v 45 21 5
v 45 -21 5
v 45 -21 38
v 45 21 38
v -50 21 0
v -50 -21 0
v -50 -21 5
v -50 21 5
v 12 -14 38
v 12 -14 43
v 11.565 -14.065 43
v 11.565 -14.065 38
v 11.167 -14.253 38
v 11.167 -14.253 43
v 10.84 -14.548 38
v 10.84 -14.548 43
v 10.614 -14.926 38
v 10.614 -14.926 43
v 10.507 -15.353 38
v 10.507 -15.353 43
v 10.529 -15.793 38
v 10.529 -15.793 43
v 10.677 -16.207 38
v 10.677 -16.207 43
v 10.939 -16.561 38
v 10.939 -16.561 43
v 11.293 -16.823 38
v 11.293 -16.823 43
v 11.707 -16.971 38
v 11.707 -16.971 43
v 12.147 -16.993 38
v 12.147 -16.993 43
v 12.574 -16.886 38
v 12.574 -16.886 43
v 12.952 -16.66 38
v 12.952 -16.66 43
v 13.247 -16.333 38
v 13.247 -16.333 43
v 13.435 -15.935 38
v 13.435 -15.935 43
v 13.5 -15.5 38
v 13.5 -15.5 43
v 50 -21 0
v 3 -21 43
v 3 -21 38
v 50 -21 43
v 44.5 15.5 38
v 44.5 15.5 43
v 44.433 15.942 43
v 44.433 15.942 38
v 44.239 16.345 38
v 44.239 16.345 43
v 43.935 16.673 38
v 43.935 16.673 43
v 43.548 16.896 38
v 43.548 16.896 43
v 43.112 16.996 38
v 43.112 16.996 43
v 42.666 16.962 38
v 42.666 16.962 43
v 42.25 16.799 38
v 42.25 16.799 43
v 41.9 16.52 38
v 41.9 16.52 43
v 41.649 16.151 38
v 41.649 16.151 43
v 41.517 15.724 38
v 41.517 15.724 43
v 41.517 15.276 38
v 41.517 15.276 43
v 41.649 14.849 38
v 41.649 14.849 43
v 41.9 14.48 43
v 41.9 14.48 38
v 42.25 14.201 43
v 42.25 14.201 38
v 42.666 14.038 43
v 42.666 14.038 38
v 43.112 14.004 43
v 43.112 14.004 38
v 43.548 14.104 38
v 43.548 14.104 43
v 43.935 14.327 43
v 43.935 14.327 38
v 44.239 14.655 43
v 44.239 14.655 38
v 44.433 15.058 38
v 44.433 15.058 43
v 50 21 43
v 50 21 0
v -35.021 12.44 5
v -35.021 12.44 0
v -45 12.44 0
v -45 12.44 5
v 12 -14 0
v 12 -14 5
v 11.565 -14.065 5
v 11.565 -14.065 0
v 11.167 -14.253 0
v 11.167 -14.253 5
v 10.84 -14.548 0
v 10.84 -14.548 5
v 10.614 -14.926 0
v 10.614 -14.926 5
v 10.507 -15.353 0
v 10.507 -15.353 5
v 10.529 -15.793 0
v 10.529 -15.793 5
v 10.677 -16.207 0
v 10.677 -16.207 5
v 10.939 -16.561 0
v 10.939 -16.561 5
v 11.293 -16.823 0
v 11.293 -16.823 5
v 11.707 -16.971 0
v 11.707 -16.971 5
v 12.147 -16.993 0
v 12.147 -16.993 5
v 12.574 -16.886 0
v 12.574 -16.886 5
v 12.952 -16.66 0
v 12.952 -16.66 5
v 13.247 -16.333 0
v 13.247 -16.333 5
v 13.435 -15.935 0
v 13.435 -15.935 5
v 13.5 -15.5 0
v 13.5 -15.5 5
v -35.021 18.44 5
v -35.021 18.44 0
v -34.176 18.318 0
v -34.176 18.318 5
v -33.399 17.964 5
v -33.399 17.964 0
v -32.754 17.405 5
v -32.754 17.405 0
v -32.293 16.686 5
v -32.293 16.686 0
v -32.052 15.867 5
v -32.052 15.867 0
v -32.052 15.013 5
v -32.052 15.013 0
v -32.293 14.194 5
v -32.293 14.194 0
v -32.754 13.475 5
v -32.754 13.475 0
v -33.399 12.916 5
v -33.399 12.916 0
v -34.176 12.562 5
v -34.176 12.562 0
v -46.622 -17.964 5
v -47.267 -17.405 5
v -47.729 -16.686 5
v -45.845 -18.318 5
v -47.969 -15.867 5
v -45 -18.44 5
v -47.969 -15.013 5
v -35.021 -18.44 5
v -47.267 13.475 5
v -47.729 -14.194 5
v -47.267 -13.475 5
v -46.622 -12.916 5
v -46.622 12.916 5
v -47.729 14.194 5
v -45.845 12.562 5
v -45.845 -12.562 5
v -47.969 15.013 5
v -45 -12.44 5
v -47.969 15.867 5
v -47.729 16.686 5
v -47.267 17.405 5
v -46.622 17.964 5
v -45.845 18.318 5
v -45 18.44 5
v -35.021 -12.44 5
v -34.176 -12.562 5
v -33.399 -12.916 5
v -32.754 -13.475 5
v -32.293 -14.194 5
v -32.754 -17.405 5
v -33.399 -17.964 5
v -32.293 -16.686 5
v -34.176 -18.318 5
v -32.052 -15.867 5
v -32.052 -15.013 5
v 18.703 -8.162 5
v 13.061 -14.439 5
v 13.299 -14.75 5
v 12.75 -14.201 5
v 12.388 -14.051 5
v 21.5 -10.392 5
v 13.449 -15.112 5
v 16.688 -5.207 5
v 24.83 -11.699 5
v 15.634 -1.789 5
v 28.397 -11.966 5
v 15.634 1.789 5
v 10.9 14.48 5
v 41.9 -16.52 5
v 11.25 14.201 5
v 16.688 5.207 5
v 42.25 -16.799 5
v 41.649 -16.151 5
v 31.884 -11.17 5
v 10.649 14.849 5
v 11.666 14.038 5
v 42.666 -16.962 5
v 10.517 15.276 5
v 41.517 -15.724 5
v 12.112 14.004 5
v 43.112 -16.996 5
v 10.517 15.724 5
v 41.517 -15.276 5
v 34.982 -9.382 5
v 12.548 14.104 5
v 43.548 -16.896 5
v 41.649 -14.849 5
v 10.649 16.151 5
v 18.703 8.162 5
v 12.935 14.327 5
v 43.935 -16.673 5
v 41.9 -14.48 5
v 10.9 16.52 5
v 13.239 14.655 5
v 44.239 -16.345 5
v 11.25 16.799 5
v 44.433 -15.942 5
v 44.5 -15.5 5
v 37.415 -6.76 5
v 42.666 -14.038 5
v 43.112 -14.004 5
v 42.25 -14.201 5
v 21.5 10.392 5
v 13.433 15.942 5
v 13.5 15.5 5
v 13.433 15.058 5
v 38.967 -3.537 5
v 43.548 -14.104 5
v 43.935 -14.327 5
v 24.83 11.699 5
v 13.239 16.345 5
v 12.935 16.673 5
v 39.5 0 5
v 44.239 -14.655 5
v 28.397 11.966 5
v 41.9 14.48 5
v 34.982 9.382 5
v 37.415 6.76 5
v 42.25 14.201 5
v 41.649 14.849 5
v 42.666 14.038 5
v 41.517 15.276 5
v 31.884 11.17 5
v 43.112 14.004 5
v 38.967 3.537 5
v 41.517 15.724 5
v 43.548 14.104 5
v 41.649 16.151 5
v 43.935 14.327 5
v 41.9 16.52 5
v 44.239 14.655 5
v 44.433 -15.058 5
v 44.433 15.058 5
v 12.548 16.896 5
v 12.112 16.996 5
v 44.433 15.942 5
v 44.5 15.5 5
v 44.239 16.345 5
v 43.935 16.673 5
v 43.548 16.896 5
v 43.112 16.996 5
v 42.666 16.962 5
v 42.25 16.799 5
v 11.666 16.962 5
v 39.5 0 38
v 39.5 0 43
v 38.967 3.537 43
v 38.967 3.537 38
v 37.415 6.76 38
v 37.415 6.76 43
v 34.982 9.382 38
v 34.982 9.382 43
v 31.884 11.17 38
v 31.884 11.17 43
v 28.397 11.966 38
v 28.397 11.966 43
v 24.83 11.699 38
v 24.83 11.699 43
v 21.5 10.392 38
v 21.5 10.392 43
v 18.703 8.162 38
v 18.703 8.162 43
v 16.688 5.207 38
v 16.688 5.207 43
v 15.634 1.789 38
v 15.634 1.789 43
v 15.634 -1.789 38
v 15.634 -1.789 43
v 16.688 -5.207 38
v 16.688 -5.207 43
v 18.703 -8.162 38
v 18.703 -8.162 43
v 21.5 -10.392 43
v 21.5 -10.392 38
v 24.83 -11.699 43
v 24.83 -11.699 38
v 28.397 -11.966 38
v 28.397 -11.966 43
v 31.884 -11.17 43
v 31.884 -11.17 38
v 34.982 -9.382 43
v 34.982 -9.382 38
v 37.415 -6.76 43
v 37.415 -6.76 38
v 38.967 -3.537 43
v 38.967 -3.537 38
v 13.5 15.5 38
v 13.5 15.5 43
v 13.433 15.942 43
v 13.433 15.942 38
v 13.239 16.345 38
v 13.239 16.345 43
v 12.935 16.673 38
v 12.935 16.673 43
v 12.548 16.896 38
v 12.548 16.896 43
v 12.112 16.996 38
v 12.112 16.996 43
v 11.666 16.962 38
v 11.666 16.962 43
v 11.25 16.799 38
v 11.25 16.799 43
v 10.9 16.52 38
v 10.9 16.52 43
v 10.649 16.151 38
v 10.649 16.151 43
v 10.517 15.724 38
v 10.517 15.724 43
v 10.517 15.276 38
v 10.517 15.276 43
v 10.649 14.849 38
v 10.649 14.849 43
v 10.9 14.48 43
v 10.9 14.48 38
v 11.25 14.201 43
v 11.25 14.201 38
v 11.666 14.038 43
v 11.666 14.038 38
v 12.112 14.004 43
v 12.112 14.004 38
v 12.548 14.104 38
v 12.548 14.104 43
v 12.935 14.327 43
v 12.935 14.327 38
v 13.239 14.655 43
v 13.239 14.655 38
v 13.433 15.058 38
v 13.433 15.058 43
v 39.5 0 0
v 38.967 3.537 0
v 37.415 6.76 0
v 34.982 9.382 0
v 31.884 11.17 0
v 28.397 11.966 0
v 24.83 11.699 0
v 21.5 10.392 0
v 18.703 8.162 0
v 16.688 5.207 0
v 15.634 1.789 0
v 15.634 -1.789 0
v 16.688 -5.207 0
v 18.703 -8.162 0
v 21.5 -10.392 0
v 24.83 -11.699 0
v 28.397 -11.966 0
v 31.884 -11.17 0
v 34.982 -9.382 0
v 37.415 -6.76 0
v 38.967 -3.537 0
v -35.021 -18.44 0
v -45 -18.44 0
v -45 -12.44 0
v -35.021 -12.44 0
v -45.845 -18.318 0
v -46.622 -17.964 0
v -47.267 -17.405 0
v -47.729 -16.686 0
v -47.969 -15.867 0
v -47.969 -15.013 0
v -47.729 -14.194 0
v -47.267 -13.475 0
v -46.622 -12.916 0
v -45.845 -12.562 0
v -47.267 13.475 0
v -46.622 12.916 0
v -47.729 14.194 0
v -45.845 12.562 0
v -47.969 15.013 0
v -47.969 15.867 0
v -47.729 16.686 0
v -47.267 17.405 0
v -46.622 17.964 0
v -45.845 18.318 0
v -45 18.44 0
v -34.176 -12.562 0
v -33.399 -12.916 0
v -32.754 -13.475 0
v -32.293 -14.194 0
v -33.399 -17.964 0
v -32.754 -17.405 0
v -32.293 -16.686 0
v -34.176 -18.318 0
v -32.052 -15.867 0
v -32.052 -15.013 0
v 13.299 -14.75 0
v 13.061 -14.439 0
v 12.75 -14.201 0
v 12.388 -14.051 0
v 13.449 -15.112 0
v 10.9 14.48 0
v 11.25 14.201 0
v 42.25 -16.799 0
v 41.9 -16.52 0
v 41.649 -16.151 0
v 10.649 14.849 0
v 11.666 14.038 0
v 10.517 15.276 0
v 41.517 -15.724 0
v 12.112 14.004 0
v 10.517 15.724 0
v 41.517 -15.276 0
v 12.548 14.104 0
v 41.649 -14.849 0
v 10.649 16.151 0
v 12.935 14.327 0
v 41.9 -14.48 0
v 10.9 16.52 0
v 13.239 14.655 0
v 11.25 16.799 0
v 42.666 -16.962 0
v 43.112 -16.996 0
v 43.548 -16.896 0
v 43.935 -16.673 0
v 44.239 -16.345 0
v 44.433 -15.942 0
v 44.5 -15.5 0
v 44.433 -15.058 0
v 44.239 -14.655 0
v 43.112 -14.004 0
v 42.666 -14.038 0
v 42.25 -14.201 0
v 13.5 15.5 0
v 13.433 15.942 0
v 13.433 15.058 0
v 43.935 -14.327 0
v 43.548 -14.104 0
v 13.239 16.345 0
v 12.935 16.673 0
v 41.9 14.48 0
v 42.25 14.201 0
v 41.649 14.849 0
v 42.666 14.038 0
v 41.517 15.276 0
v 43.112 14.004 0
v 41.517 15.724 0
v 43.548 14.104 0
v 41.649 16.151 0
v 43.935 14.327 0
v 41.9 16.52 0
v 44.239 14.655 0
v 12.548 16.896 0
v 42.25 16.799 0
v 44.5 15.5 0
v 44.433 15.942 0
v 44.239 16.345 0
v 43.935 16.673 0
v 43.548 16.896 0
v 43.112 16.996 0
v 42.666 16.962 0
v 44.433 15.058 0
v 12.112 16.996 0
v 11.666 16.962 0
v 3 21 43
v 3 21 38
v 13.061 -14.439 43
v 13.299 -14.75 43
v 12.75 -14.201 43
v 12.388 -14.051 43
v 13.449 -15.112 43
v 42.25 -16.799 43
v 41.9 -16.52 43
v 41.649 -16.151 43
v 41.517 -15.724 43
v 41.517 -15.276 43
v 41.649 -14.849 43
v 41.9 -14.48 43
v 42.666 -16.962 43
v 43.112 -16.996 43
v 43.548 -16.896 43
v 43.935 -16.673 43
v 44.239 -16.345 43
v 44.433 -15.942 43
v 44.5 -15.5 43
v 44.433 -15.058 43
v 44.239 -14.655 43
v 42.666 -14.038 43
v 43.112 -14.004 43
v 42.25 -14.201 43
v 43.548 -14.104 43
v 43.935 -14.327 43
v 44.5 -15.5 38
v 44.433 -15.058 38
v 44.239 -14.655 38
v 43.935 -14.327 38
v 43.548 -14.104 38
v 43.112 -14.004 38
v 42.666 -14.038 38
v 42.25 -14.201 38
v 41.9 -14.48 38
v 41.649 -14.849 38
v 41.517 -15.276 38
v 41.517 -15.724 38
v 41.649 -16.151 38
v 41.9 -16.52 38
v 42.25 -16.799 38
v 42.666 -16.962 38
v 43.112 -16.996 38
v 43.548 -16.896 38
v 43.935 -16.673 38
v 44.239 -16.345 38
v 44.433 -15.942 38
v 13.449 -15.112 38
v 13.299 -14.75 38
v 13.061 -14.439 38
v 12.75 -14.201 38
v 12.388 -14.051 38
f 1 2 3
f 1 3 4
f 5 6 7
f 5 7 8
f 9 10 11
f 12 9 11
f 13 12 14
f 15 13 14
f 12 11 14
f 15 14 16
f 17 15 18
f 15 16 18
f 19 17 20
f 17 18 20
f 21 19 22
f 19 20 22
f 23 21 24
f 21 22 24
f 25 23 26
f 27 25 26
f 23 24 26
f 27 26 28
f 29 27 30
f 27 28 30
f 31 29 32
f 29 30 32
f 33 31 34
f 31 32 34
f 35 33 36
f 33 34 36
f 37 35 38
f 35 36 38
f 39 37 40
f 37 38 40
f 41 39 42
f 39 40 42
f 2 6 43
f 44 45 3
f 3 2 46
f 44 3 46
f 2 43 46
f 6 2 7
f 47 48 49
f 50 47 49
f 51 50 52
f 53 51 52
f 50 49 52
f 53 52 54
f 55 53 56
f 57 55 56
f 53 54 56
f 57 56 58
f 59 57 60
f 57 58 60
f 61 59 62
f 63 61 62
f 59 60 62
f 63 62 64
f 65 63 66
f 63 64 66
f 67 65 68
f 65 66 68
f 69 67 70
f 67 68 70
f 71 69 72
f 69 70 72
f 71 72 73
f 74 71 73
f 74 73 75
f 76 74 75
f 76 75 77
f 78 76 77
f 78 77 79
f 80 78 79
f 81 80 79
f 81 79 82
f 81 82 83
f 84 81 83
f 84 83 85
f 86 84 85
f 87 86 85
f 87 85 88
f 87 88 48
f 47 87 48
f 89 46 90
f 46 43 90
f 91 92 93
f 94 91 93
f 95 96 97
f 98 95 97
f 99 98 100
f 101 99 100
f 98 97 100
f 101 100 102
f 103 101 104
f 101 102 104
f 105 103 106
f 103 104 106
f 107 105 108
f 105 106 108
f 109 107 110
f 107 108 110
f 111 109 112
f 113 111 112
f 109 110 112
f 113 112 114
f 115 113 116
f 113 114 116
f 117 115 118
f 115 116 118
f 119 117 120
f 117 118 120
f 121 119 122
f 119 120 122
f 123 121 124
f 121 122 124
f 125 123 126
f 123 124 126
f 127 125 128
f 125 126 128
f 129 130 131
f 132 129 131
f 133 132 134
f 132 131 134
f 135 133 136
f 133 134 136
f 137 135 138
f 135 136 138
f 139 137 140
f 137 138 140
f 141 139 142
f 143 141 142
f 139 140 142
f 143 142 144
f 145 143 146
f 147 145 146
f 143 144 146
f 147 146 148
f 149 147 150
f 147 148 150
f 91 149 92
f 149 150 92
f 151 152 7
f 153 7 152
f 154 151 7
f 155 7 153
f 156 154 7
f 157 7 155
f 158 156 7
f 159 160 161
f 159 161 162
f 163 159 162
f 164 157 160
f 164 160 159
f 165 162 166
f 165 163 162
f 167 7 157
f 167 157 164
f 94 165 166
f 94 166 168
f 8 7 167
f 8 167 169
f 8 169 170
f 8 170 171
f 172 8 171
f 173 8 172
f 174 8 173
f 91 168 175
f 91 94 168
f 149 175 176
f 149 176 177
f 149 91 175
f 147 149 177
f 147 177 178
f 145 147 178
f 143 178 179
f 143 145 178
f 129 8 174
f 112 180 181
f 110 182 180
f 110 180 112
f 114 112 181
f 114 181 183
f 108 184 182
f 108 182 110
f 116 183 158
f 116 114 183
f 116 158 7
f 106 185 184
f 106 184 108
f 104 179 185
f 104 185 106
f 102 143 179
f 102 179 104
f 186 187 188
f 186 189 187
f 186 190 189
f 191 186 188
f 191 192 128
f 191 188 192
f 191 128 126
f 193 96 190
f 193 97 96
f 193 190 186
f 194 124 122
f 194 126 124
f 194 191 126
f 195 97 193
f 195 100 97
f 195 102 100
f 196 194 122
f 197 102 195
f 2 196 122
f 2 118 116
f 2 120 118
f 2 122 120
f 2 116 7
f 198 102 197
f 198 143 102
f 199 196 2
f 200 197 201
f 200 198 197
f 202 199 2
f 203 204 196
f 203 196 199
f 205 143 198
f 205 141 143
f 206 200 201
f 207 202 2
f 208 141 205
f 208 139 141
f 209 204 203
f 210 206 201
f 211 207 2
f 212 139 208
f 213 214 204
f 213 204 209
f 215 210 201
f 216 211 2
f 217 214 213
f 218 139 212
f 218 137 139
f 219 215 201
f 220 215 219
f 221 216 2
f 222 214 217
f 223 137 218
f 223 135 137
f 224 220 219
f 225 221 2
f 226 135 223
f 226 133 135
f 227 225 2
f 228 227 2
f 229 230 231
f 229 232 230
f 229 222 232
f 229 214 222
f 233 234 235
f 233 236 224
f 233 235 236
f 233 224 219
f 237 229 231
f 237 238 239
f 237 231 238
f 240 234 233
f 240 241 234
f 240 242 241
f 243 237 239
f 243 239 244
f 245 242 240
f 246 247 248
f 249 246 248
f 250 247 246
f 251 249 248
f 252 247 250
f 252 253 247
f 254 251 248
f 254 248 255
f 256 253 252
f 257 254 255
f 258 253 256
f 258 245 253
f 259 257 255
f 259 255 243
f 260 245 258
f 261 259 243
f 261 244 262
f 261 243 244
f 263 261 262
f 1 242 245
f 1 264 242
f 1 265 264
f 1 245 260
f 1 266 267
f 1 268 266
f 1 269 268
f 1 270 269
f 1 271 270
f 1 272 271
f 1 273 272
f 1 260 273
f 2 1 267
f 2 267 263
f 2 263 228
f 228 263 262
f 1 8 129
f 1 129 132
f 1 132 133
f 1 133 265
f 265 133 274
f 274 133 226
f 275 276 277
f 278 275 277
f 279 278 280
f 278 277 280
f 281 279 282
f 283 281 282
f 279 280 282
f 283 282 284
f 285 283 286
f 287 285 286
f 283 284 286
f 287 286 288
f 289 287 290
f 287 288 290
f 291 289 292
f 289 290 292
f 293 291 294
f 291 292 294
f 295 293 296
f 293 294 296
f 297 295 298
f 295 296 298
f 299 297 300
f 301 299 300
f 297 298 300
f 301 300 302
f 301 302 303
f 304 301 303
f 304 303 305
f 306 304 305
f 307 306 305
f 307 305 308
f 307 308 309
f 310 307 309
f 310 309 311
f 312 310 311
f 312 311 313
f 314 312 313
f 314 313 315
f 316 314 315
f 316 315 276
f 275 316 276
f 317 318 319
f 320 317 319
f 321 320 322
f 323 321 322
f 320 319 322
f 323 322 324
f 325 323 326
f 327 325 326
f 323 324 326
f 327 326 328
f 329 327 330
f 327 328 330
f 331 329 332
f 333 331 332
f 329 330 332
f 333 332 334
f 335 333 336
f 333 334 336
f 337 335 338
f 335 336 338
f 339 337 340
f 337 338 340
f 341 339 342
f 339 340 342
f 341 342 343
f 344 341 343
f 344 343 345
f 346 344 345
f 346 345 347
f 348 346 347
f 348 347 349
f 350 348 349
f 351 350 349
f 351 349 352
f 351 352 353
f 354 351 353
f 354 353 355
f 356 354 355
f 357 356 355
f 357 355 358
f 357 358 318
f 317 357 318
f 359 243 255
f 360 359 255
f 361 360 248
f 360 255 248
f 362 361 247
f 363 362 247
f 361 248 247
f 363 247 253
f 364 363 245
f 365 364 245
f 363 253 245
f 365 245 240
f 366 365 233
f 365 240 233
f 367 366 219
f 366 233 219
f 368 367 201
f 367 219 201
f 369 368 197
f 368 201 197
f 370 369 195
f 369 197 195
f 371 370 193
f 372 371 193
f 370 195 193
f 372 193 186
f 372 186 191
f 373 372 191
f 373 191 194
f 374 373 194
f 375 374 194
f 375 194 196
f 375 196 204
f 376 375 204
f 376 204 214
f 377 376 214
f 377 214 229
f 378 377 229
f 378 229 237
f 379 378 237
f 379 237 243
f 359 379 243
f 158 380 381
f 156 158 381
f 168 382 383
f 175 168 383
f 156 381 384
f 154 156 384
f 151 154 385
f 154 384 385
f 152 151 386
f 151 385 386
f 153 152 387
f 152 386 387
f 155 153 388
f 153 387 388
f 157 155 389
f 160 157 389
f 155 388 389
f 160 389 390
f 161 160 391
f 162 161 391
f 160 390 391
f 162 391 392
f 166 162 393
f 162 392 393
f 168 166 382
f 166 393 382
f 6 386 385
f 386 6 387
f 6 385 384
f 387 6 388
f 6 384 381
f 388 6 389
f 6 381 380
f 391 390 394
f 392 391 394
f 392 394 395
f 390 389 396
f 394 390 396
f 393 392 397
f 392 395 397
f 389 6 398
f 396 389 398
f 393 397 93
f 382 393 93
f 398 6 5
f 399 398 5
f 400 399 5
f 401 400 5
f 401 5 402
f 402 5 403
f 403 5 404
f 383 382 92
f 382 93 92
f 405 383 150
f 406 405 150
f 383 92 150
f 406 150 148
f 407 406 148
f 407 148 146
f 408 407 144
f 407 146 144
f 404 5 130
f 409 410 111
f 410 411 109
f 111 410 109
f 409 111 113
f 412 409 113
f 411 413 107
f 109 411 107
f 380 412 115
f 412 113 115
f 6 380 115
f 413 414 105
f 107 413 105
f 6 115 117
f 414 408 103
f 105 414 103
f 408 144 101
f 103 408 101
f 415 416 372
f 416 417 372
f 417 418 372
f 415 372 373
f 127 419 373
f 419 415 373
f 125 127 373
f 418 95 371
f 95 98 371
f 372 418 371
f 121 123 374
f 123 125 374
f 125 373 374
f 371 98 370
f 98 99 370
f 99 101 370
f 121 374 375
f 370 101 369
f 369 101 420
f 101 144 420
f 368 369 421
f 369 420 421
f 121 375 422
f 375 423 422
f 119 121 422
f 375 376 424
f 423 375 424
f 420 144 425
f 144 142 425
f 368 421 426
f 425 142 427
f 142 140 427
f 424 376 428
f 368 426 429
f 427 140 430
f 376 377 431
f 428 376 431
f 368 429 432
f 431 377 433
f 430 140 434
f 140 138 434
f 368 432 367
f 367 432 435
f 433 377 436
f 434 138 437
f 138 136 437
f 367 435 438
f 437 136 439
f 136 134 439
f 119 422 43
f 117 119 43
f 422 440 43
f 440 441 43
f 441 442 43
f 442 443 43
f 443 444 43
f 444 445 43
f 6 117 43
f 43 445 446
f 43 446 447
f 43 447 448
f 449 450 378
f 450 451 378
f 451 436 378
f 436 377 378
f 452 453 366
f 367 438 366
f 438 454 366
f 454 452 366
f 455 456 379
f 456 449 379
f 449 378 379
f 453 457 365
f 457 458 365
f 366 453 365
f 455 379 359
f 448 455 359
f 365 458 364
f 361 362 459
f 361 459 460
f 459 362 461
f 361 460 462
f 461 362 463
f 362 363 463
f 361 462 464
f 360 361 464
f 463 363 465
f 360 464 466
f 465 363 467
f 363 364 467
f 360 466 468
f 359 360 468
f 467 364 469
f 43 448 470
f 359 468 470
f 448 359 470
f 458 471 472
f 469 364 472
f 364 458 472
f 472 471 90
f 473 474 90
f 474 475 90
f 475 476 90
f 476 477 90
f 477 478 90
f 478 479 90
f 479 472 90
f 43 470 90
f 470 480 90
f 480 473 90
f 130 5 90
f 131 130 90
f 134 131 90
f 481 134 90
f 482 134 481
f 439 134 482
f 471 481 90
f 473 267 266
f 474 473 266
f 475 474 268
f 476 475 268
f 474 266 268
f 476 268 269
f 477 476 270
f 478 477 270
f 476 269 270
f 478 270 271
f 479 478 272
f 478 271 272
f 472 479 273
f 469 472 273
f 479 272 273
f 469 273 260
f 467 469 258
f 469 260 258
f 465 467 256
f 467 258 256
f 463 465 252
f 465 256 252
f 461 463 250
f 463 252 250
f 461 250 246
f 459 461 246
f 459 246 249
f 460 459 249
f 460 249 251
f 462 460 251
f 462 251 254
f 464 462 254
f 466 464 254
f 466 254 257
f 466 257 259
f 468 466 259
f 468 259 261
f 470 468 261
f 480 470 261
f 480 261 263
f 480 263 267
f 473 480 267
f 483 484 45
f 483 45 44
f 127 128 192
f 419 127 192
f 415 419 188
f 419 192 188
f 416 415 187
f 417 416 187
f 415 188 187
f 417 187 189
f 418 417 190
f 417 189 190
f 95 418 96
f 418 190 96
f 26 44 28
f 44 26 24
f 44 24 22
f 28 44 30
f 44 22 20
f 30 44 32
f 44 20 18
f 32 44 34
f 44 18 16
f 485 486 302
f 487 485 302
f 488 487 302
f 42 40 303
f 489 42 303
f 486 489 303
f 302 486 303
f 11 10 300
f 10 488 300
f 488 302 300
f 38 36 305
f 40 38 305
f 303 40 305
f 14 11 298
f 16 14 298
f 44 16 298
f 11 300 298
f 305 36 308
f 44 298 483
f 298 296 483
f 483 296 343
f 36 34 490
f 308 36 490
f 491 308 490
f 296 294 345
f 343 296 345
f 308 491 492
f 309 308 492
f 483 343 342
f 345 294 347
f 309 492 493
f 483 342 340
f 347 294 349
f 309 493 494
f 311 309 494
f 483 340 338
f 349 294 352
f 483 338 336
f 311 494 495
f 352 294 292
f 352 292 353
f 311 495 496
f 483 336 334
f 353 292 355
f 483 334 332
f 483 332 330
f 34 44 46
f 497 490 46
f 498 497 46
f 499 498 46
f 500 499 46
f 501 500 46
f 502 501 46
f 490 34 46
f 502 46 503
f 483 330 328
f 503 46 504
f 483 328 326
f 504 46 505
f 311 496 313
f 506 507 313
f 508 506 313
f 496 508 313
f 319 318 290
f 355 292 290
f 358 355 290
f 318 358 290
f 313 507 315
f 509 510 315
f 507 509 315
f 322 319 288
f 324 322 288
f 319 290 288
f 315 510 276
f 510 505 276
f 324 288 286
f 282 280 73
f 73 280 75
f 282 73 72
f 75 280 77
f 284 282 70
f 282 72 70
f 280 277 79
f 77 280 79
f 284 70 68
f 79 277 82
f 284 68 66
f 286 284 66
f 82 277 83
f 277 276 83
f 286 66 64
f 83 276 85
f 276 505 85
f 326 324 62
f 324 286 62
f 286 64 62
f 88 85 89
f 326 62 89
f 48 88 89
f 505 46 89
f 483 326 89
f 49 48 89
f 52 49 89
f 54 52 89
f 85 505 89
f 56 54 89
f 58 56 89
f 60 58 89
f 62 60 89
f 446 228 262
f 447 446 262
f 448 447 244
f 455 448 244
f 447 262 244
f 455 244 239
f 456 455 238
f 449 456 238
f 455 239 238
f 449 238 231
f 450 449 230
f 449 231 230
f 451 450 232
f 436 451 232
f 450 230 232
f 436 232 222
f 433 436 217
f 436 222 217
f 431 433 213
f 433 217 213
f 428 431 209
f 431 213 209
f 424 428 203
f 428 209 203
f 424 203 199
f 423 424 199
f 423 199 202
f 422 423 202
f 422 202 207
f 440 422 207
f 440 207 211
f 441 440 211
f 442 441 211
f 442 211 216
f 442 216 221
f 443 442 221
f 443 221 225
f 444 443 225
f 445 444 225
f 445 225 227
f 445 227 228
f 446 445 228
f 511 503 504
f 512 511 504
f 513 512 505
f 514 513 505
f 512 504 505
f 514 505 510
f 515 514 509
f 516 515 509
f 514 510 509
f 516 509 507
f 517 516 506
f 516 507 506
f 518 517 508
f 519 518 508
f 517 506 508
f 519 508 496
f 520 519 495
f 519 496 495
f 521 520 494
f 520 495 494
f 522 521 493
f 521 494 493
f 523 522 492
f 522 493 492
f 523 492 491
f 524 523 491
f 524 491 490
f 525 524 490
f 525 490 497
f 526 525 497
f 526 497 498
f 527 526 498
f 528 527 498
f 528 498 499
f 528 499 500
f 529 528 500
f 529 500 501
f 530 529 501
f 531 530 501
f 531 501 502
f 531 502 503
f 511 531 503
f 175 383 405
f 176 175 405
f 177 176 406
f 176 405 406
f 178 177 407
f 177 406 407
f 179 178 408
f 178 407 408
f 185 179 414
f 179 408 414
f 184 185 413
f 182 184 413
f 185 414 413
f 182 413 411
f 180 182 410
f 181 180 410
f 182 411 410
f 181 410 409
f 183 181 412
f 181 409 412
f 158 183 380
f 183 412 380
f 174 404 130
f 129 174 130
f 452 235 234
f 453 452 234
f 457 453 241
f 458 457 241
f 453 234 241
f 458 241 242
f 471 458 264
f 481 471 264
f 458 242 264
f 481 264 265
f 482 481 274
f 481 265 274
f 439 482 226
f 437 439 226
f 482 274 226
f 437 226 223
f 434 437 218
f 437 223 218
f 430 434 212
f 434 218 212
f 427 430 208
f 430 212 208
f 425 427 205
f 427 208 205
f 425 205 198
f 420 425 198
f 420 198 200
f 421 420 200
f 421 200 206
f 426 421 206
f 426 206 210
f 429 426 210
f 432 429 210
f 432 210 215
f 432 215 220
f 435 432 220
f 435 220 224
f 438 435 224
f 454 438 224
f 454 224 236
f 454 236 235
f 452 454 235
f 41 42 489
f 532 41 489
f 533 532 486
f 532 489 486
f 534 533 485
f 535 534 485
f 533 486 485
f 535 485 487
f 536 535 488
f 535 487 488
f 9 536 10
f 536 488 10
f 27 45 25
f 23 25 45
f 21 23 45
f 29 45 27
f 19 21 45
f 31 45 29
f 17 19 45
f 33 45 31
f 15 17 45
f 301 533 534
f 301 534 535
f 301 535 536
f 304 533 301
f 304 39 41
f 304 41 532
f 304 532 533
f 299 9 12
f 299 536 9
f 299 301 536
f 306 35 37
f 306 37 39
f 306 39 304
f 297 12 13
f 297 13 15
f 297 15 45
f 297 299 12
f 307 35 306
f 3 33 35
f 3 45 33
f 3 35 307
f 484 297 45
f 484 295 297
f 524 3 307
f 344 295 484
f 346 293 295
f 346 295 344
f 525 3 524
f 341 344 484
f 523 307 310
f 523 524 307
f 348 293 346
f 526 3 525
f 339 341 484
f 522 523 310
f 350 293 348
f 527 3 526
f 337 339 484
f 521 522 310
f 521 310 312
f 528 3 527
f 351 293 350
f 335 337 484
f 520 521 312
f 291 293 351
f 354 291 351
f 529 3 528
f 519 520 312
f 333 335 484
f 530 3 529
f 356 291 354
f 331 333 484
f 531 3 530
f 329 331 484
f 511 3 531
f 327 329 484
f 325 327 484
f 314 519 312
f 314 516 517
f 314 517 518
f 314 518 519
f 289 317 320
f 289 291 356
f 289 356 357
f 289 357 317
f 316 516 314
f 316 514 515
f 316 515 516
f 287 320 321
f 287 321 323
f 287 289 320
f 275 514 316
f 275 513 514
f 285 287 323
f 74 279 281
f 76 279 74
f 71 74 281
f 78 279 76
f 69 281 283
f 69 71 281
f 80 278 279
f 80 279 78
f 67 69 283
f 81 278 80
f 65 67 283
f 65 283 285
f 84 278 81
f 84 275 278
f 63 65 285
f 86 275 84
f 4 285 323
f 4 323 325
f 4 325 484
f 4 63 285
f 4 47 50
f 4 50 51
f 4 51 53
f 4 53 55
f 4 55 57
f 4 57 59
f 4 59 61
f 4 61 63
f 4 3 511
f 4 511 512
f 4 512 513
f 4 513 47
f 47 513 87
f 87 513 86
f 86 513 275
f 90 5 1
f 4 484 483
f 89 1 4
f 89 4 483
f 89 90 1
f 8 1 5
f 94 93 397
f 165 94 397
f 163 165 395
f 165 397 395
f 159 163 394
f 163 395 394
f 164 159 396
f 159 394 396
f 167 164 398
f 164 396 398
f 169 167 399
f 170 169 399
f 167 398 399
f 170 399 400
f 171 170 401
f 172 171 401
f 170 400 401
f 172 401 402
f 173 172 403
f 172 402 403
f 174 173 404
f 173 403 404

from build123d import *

# Parameters (mm, degrees)
CROQUIS1_W              = 100
CROQUIS1_H              = 42
SALIENTE_EXTRUIR1_DEPTH = 5
CROQUIS2_W              = 5
CROQUIS2_H              = 42
SALIENTE_EXTRUIR2_DEPTH = 38
CROQUIS3_W              = 5
CROQUIS3_H              = 42
SALIENTE_EXTRUIR3_DEPTH = 42
CROQUIS7_R              = 1.5
CORTAR_EXTRUIR1_DEPTH   = 43
CROQUIS8_R              = 12
CORTAR_EXTRUIR2_DEPTH   = 43


with BuildPart() as part:
    # Croquis1 → Saliente-Extruir1 (new body)
    with BuildSketch(Plane.XY):
        Rectangle(CROQUIS1_W, CROQUIS1_H)
        with BuildLine():
            Line((-45, 18.44), (-35.021412409, 18.44))
            ThreePointArc((-35.021412409, 18.44), (-32.021412409, 15.44), (-35.021412409, 12.44))
            Line((-35.021412409, 12.44), (-45, 12.44))
            ThreePointArc((-45, 12.44), (-48, 15.44), (-45, 18.44))
        make_face(mode=Mode.SUBTRACT)
        with BuildLine():
            Line((-45, -12.44), (-35.021412409, -12.44))
            ThreePointArc((-35.021412409, -12.44), (-32.021412409, -15.44), (-35.021412409, -18.44))
            Line((-35.021412409, -18.44), (-45, -18.44))
            ThreePointArc((-45, -18.44), (-48, -15.44), (-45, -12.44))
        make_face(mode=Mode.SUBTRACT)
    extrude(amount=SALIENTE_EXTRUIR1_DEPTH)

    # Croquis2 → Saliente-Extruir2 (add)
    with BuildSketch(Plane.XY.offset(5)):
        with Locations((47.5, 0)):
            Rectangle(CROQUIS2_W, CROQUIS2_H)
    extrude(amount=SALIENTE_EXTRUIR2_DEPTH)

    # Croquis3 → Saliente-Extruir3 (add)
    with BuildSketch(Plane.ZY.offset(-45)):
        with Locations((40.5, 0)):
            Rectangle(CROQUIS3_W, CROQUIS3_H)
    extrude(amount=SALIENTE_EXTRUIR3_DEPTH)

    # Croquis7 → Cortar-Extruir1 (cut)
    with BuildSketch(Plane.XY.offset(43)):
        with BuildLine():
            ThreePointArc((13.5, -15.5), (13.060660172, -14.439339828), (12, -14))
            Line((12, -14), (12, -15.5))
            Line((12, -15.5), (13.5, -15.5))
        make_face()
        with BuildLine():
            Line((12, -15.5), (12, -14))
            ThreePointArc((12, -14), (10.939339828, -16.560660172), (13.5, -15.5))
            Line((13.5, -15.5), (12, -15.5))
        make_face()
        with Locations((12, 15.5)):
            Circle(CROQUIS7_R)
        with Locations((43, 15.5)):
            Circle(CROQUIS7_R)
        with Locations((43, -15.5)):
            Circle(CROQUIS7_R)
    extrude(amount=-CORTAR_EXTRUIR1_DEPTH, mode=Mode.SUBTRACT)

    # Croquis8 → Cortar-Extruir2 (cut)
    with BuildSketch(Plane.XY.offset(43)):
        with Locations((27.5, 0)):
            Circle(CROQUIS8_R)
    extrude(amount=-CORTAR_EXTRUIR2_DEPTH, mode=Mode.SUBTRACT)


solid = part.part
